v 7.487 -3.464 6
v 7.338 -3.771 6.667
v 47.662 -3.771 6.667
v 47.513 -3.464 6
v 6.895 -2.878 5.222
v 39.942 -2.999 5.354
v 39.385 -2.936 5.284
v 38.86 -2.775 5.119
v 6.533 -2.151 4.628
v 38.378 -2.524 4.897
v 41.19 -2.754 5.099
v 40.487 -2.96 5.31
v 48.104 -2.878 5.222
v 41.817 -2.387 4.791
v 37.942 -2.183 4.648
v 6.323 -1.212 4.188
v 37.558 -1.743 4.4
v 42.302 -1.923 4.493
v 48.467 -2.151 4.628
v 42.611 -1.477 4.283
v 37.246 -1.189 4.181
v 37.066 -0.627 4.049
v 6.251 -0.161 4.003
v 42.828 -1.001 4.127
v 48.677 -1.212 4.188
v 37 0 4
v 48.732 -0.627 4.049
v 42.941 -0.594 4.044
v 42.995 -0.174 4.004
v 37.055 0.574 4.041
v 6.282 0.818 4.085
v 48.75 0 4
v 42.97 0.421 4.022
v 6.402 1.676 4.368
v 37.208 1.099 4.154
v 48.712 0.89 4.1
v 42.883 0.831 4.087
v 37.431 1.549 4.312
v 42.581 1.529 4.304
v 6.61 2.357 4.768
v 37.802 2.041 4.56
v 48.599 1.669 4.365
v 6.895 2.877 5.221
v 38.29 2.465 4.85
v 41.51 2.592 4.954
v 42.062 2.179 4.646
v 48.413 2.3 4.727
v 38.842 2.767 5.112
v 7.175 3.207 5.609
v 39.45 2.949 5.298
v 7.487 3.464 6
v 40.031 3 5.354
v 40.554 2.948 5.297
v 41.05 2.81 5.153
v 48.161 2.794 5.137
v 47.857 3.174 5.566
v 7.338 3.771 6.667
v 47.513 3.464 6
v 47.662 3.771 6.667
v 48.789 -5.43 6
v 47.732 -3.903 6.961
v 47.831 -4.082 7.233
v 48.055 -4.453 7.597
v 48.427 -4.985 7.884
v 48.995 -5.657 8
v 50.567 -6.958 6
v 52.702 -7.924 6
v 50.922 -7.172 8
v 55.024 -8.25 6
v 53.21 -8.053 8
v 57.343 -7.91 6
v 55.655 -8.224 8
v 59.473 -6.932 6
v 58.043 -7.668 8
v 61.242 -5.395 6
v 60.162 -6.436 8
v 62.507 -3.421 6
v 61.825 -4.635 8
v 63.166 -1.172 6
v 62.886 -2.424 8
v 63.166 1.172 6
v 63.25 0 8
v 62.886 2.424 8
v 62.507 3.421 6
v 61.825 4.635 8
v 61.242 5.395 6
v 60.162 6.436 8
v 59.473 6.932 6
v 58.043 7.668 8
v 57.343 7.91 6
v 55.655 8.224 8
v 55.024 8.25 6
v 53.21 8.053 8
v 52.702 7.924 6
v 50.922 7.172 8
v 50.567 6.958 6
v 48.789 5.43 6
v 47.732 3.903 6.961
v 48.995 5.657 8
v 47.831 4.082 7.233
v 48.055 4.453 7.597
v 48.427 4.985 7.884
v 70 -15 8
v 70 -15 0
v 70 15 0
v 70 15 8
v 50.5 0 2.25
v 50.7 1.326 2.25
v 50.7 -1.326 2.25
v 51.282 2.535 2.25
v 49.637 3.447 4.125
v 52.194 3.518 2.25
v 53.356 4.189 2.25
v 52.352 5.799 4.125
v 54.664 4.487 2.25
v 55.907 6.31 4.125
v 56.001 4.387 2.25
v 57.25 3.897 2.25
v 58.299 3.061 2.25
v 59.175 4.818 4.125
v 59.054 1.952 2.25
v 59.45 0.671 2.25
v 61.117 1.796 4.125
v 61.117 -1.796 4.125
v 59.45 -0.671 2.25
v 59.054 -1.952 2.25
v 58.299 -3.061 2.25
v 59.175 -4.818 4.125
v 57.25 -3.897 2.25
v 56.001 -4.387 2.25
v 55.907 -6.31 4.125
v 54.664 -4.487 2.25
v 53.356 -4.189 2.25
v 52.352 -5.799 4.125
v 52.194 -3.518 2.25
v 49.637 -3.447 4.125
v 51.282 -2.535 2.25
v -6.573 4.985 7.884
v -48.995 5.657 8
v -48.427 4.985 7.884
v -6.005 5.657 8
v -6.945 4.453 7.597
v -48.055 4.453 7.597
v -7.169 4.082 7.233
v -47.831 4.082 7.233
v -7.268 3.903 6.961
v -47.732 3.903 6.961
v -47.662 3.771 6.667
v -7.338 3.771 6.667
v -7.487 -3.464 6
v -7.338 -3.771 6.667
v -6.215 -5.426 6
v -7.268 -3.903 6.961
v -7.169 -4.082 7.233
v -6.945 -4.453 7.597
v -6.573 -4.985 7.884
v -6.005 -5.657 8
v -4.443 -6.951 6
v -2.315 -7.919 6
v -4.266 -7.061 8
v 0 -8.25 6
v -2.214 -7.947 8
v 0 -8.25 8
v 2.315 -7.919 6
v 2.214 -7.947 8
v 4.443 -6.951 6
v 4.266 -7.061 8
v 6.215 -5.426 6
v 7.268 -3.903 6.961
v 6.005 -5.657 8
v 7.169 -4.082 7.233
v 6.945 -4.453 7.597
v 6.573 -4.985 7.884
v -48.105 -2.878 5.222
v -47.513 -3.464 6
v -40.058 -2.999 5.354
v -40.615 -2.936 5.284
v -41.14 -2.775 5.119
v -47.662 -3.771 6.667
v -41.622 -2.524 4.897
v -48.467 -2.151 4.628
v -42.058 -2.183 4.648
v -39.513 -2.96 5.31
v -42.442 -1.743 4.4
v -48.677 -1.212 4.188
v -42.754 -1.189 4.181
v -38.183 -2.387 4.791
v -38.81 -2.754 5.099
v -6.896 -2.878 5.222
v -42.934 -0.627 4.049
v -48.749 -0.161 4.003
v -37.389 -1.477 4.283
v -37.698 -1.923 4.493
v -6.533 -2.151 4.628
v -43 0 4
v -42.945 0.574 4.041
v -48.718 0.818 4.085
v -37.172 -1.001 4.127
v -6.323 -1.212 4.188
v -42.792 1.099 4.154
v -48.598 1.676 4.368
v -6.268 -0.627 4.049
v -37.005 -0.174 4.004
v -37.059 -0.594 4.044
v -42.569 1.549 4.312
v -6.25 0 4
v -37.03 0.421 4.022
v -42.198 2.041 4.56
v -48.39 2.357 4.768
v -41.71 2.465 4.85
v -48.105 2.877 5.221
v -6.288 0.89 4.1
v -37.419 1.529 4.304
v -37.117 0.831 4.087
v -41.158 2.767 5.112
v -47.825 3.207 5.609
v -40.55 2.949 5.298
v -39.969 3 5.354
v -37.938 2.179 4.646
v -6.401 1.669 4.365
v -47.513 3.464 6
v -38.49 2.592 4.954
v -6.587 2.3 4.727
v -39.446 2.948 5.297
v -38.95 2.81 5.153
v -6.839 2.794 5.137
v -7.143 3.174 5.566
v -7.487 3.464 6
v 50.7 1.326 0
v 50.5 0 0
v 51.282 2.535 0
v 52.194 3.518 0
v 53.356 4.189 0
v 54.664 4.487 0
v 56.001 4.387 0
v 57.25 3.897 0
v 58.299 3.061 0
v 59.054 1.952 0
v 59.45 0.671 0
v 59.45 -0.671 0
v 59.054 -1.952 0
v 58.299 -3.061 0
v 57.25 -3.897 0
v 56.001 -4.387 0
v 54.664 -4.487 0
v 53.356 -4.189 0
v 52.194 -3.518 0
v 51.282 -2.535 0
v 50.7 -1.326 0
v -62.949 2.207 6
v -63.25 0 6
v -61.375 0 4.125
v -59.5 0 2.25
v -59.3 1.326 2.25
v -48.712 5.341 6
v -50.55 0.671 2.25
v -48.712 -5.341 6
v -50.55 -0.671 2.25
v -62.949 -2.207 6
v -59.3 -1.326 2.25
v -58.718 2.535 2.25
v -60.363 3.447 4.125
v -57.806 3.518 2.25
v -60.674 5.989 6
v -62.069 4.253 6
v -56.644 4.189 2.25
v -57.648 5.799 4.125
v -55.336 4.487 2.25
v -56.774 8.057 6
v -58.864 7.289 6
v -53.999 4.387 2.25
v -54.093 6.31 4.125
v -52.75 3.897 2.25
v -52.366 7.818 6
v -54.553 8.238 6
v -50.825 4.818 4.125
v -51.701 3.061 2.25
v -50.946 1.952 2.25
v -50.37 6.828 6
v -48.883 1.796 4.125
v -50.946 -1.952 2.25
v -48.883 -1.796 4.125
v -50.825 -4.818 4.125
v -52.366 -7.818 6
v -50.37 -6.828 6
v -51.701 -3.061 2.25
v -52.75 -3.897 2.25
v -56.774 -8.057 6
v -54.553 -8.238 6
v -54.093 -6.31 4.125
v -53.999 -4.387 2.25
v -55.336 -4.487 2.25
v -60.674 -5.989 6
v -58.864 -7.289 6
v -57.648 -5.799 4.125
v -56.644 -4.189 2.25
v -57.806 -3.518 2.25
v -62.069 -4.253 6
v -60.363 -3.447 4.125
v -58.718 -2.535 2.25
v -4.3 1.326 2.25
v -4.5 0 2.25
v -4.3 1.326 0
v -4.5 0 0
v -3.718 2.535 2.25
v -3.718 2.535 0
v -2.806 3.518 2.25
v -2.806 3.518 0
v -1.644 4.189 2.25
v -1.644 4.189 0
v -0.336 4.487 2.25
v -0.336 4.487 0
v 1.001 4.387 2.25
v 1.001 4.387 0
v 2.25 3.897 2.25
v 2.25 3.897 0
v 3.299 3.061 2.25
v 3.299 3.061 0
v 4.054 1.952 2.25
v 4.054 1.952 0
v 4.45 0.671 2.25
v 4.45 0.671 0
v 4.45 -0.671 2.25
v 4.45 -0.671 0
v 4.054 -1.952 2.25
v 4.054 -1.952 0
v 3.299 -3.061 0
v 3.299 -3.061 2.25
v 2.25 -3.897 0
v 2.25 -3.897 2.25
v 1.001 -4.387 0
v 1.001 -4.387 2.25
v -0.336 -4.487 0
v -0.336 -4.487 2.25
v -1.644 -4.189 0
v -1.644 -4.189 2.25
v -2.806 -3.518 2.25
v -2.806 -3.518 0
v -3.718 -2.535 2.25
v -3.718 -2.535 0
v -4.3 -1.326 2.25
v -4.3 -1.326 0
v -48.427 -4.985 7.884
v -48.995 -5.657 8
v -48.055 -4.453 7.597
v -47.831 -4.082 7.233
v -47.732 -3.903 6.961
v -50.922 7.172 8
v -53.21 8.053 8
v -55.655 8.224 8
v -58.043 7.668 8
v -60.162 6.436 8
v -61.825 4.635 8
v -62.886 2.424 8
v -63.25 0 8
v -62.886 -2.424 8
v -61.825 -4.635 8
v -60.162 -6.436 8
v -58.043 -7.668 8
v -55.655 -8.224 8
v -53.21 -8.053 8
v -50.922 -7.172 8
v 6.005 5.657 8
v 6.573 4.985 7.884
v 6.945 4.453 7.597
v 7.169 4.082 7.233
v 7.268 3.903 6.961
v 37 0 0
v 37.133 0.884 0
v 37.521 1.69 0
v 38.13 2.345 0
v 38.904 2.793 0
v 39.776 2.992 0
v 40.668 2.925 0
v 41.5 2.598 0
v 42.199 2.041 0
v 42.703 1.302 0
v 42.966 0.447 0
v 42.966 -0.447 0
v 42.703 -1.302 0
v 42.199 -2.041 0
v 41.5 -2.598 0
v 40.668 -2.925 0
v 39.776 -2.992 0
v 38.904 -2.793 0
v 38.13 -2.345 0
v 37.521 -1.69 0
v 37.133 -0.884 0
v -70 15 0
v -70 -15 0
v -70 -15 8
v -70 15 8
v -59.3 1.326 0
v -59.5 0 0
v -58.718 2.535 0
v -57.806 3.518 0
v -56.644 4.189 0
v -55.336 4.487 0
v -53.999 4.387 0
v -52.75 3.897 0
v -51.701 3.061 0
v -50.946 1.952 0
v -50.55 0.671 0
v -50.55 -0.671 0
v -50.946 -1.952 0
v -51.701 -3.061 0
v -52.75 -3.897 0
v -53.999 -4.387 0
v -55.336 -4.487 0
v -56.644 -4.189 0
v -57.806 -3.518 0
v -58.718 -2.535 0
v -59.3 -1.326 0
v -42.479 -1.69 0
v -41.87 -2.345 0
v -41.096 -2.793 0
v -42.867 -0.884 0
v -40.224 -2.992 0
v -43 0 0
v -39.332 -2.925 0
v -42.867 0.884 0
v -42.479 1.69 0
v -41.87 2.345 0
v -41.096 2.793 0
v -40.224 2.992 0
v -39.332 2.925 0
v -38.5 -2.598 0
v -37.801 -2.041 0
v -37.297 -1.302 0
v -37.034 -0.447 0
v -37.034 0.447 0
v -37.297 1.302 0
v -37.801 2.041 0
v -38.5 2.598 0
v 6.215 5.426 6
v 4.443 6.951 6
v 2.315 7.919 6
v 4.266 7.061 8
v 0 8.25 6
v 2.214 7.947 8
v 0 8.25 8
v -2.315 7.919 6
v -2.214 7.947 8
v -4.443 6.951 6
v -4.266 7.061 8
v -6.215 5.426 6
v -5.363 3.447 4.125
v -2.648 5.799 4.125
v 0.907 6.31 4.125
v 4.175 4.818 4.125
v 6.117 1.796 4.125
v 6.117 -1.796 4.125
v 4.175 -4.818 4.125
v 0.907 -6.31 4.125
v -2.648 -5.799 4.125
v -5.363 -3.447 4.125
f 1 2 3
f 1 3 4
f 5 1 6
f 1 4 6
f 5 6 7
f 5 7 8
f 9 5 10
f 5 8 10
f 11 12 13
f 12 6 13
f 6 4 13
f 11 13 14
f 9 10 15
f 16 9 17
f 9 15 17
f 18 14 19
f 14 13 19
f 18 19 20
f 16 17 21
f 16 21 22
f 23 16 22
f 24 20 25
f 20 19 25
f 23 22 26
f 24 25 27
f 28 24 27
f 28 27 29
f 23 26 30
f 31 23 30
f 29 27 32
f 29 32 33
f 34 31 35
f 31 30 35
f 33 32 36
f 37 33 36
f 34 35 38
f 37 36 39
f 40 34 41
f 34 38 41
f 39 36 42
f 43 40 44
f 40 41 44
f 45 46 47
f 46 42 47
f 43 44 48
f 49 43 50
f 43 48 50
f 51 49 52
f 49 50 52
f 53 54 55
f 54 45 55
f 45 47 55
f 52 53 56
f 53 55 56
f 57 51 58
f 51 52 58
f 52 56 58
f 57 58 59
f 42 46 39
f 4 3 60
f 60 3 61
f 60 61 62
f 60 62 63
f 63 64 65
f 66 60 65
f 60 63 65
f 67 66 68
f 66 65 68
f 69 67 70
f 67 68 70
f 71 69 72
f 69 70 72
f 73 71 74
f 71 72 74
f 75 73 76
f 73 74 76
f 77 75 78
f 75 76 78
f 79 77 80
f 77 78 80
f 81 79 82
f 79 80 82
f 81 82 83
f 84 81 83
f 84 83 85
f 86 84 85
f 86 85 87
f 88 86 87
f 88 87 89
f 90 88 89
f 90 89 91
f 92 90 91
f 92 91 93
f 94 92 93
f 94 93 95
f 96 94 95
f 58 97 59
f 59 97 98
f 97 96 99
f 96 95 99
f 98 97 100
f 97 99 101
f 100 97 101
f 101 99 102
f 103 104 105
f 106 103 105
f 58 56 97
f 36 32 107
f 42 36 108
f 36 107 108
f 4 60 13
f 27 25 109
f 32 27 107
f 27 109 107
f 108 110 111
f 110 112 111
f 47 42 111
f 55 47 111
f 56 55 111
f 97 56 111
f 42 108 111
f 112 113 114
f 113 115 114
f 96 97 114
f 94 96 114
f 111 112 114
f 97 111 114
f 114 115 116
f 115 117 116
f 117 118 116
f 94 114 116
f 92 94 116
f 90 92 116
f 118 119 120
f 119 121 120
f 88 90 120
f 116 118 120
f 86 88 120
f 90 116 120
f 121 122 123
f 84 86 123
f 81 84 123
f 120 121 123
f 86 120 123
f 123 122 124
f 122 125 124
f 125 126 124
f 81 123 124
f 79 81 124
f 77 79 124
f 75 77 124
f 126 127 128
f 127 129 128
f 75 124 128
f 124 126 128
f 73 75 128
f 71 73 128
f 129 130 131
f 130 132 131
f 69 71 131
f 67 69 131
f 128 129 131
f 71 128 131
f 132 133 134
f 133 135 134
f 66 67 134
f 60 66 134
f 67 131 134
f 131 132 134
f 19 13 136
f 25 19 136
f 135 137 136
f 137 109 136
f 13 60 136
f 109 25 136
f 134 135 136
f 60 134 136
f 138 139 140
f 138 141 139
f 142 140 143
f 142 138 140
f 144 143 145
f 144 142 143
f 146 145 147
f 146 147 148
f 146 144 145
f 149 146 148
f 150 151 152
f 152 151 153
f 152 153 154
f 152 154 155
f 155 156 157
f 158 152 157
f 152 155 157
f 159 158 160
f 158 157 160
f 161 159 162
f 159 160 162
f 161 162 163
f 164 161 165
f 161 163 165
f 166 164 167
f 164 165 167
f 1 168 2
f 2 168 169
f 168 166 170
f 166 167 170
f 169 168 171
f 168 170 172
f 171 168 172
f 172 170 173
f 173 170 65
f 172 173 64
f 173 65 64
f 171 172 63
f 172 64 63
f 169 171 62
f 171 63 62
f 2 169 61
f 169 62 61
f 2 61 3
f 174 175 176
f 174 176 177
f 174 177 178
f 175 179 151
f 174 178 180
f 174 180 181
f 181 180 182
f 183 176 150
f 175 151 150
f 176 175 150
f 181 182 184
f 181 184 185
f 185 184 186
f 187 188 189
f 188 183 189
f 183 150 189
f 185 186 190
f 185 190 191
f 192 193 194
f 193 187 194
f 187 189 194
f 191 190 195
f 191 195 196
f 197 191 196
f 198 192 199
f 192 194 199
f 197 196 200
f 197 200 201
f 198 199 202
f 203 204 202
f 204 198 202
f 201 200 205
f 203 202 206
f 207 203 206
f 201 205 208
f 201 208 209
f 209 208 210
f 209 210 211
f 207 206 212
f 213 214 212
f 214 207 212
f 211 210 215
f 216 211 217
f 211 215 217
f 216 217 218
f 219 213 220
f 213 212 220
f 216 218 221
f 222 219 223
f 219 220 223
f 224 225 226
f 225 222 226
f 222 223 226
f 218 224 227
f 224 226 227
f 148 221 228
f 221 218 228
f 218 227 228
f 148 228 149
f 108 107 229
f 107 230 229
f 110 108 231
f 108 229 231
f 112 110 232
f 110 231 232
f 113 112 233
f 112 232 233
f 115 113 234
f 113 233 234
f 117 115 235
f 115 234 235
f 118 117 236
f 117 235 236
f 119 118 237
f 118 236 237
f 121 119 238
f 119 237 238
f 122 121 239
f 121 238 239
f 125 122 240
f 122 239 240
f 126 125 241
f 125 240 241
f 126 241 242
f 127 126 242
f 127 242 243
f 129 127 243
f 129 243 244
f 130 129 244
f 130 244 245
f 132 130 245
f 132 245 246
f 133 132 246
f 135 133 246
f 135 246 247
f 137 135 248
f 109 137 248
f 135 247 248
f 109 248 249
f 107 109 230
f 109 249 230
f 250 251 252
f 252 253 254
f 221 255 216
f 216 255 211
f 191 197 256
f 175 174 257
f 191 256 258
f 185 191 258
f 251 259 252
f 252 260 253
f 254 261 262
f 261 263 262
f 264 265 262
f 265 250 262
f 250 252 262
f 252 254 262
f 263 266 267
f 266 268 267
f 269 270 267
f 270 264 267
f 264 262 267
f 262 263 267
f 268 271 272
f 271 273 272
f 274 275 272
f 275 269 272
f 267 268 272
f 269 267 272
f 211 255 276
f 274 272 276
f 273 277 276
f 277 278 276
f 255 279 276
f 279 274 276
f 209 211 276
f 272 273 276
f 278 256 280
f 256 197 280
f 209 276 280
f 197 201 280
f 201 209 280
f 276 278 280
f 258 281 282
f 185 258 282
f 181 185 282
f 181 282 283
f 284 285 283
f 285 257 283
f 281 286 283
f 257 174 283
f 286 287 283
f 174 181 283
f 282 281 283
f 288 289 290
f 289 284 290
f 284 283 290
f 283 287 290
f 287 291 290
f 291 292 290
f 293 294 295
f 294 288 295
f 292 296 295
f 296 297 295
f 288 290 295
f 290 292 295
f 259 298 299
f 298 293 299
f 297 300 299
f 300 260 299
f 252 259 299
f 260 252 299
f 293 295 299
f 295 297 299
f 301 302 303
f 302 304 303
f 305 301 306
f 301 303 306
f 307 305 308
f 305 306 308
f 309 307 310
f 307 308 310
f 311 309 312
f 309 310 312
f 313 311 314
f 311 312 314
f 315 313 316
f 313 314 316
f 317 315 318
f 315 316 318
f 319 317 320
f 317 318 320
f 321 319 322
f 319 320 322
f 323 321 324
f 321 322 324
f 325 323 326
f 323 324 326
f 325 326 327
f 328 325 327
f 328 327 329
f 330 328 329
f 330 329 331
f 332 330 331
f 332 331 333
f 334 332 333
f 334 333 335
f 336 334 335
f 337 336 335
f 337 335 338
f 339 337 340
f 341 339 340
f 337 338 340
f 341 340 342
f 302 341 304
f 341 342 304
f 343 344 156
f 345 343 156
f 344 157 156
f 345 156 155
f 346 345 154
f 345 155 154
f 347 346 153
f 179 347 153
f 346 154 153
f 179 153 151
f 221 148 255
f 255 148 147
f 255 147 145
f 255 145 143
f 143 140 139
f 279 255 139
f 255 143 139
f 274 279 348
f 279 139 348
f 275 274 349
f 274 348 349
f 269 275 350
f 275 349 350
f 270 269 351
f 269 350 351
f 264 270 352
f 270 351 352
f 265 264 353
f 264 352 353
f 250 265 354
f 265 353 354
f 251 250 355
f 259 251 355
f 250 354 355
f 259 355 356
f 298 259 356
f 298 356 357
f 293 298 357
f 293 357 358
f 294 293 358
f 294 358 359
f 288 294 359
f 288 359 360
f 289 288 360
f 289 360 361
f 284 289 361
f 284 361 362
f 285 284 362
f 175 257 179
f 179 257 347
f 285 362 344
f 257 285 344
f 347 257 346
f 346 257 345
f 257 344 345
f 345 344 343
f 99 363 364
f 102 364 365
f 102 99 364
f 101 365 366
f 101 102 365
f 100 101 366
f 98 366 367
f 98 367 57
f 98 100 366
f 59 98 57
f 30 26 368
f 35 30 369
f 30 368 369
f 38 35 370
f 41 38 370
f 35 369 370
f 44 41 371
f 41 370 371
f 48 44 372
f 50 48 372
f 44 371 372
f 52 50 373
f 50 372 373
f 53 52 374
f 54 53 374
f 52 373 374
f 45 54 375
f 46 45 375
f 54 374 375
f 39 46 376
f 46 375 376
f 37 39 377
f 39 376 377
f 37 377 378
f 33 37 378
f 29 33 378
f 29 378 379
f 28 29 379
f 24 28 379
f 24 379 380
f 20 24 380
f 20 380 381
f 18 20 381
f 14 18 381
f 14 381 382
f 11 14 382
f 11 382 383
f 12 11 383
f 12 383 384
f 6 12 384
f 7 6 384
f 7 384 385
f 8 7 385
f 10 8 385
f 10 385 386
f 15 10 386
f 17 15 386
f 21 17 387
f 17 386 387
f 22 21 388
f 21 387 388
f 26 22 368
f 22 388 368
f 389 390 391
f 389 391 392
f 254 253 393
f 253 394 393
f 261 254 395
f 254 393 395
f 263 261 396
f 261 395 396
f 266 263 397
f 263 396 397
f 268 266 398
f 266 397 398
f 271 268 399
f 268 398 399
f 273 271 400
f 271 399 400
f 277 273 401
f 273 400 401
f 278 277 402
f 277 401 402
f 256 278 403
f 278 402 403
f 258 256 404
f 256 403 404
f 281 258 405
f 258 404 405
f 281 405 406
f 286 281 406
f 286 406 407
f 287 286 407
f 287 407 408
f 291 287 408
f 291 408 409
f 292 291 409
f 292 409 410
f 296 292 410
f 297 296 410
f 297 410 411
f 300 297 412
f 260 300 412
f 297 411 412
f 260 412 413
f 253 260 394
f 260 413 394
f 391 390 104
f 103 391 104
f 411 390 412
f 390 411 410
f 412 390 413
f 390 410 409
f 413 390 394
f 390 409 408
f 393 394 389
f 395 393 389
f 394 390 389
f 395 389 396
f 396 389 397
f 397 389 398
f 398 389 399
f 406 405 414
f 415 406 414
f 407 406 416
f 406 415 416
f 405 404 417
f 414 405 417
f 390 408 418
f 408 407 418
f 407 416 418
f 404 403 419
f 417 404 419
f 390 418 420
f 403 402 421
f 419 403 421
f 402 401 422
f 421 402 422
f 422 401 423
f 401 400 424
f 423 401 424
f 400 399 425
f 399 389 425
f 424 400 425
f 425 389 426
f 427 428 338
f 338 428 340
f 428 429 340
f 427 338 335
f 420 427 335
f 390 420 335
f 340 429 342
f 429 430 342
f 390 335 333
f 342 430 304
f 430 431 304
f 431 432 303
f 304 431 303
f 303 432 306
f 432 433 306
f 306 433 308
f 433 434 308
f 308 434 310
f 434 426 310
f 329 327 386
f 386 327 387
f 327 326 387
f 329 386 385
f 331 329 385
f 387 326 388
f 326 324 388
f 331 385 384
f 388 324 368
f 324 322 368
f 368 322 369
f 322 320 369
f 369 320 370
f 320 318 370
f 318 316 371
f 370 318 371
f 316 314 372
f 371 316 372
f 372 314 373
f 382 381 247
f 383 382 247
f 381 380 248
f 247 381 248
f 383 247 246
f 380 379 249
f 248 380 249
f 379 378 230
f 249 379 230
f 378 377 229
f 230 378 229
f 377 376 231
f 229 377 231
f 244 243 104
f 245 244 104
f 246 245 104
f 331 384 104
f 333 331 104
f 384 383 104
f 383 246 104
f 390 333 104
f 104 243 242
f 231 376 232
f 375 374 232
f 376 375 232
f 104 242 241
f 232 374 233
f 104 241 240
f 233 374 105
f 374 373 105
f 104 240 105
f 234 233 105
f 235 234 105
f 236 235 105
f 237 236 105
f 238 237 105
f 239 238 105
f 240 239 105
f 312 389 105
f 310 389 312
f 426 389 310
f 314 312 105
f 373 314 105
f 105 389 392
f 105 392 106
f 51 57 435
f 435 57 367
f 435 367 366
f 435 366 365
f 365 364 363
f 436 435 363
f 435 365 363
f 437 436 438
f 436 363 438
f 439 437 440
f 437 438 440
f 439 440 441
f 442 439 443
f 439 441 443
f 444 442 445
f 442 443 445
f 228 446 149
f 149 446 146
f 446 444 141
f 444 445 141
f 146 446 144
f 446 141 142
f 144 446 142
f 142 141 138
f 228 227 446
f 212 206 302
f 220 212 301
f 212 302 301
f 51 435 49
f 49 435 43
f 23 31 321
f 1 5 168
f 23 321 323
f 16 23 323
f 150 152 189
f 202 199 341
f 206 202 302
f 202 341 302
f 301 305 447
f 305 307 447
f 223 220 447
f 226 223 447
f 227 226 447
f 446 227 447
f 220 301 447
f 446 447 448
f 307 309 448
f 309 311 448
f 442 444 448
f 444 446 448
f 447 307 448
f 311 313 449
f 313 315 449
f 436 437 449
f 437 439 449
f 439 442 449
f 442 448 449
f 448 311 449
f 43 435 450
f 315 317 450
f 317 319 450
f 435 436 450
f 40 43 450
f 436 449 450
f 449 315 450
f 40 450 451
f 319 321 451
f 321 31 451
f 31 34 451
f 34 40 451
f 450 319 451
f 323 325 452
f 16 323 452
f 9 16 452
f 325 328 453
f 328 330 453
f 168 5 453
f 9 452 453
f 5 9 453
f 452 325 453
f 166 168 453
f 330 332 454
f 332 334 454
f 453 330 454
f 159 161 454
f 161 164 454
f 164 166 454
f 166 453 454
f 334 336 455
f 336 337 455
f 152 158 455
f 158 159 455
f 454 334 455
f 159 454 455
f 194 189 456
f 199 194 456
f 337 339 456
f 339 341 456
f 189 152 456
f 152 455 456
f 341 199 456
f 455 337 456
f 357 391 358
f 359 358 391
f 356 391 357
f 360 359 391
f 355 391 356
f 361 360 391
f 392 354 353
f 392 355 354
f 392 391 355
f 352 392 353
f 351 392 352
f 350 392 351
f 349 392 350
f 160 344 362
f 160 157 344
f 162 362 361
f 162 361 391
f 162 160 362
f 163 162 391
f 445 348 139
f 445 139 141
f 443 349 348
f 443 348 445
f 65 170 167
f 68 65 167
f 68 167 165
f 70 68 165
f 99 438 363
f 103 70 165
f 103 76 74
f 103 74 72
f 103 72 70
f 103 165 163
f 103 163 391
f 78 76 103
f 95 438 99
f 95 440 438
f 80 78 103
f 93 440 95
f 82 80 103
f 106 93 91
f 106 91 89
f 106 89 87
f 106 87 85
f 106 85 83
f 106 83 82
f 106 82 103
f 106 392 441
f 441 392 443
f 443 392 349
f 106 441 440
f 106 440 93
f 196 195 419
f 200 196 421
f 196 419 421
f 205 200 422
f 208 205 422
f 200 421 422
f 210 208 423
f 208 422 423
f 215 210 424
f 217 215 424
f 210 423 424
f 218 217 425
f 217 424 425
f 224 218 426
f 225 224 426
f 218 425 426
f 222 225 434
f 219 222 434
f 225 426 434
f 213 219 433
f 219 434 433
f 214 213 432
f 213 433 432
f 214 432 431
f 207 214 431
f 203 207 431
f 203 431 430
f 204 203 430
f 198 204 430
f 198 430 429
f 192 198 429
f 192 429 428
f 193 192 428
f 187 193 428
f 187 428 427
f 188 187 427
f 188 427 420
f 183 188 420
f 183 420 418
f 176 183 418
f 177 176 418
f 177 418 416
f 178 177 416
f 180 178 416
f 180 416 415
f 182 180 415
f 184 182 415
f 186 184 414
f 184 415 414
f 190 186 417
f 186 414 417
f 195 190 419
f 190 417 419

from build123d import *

# Parameters (mm, degrees)
F0_W           = 140
F0_H           = 30
F1_DEPTH       = 8
F2_R           = 8.25
F3_DEPTH       = 2
F5_D           = 9
F5_CSINK_D     = 16.5
F5_CSINK_ANGLE = 90
F6_R           = 4
F7_DEPTH       = 55
F8_R           = 2
F10_D          = 6


with BuildPart() as f1:
    # F0 (on Top) → F1 (new body)
    with BuildSketch(Plane.XY):
        Rectangle(F0_W, F0_H)
    extrude(amount=F1_DEPTH)

    # F2 (on face) → F3 (cut)
    with BuildSketch(Plane.XY.offset(8)):
        with Locations((-55, 0)):
            Circle(F2_R)
        Circle(F2_R)
        with Locations((55, 0)):
            Circle(F2_R)
    extrude(amount=-F3_DEPTH, mode=Mode.SUBTRACT)

    # F5 (through all)
    with Locations(Plane.XY.offset(6)):
        with Locations((-55, 0), (0, 0), (55, 0)):
            CounterSinkHole(F5_D / 2, F5_CSINK_D / 2, counter_sink_angle=F5_CSINK_ANGLE)

    # F6 (on Right) → F7 (cut, symmetric)
    with BuildSketch(Plane.YZ):
        with Locations((0, 8)):
            Circle(F6_R)
    extrude(amount=F7_DEPTH, both=True, mode=Mode.SUBTRACT)

    # F8
    f8_edges = [f1.edges().sort_by_distance(p)[0] for p in [
        (-27.5, 4, 8),
        (27.5, 4, 8),
        (27.5, -4, 8),
        (-27.5, -4, 8),
    ]]
    fillet(f8_edges, radius=F8_R)

    # F10 (through all)
    with Locations(Plane.XY.offset(8)):
        with Locations((-40, 0), (40, 0)):
            Hole(F10_D / 2)


solid = f1.part
